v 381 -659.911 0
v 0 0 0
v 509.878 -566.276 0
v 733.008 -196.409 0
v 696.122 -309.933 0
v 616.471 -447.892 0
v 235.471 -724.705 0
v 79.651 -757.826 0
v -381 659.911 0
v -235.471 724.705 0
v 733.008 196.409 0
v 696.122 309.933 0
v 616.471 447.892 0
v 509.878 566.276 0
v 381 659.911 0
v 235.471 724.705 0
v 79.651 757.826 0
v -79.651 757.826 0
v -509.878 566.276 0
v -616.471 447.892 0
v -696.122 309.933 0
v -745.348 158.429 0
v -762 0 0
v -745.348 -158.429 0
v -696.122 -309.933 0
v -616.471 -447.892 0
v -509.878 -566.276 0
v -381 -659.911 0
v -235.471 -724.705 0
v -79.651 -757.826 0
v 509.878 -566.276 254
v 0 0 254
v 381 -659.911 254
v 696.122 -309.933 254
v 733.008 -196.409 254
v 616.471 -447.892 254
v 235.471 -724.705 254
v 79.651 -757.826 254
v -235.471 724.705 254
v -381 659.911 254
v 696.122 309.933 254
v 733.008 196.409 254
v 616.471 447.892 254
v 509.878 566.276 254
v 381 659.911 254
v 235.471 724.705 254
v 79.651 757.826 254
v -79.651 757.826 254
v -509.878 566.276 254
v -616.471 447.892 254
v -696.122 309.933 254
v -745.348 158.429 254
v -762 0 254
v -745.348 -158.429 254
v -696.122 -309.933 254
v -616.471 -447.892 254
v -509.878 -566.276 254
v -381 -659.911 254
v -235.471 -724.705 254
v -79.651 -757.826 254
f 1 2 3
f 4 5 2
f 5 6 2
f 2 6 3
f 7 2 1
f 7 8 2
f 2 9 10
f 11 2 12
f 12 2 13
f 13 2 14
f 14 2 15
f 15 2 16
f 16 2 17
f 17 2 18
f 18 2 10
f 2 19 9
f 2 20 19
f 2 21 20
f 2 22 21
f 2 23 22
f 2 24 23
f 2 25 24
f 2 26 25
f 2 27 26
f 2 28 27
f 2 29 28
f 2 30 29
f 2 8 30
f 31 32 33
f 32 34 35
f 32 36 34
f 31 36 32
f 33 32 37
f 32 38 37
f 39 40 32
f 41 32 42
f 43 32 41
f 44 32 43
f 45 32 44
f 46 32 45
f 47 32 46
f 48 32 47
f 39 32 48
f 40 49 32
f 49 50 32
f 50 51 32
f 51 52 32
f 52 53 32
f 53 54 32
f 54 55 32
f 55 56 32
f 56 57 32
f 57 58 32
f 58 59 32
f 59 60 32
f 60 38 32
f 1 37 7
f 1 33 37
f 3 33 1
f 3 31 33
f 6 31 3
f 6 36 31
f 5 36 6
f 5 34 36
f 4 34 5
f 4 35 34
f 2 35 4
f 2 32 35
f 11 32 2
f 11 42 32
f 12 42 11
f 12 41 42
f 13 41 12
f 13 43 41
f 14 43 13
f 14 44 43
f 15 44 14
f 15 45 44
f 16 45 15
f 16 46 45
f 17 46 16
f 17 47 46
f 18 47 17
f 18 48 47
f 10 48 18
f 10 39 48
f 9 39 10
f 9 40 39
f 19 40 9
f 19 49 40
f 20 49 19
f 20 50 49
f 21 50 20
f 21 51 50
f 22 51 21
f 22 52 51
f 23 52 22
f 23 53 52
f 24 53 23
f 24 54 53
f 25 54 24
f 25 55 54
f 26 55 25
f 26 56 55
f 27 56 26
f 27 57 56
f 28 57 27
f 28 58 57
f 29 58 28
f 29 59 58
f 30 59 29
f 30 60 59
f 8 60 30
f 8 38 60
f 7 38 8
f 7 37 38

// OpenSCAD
// Unit of length: Unit.MM
linear_extrude(height = 254.0, center = false, convexity = 2, twist = 0.0, scale = 1.0)
{
   intersection()
   {
      circle(r = 762.0, $fa = 12.0, $fs = 50.8, $fn = 0);
      polygon(points = [[0.0, 0.0], [849.9117, 227.7332], [0.0, 1077.6449], [-1077.6449, 0.0], [0.0, -1077.6449], [849.9117, -227.7332]], convexity = 2);
   }
}
